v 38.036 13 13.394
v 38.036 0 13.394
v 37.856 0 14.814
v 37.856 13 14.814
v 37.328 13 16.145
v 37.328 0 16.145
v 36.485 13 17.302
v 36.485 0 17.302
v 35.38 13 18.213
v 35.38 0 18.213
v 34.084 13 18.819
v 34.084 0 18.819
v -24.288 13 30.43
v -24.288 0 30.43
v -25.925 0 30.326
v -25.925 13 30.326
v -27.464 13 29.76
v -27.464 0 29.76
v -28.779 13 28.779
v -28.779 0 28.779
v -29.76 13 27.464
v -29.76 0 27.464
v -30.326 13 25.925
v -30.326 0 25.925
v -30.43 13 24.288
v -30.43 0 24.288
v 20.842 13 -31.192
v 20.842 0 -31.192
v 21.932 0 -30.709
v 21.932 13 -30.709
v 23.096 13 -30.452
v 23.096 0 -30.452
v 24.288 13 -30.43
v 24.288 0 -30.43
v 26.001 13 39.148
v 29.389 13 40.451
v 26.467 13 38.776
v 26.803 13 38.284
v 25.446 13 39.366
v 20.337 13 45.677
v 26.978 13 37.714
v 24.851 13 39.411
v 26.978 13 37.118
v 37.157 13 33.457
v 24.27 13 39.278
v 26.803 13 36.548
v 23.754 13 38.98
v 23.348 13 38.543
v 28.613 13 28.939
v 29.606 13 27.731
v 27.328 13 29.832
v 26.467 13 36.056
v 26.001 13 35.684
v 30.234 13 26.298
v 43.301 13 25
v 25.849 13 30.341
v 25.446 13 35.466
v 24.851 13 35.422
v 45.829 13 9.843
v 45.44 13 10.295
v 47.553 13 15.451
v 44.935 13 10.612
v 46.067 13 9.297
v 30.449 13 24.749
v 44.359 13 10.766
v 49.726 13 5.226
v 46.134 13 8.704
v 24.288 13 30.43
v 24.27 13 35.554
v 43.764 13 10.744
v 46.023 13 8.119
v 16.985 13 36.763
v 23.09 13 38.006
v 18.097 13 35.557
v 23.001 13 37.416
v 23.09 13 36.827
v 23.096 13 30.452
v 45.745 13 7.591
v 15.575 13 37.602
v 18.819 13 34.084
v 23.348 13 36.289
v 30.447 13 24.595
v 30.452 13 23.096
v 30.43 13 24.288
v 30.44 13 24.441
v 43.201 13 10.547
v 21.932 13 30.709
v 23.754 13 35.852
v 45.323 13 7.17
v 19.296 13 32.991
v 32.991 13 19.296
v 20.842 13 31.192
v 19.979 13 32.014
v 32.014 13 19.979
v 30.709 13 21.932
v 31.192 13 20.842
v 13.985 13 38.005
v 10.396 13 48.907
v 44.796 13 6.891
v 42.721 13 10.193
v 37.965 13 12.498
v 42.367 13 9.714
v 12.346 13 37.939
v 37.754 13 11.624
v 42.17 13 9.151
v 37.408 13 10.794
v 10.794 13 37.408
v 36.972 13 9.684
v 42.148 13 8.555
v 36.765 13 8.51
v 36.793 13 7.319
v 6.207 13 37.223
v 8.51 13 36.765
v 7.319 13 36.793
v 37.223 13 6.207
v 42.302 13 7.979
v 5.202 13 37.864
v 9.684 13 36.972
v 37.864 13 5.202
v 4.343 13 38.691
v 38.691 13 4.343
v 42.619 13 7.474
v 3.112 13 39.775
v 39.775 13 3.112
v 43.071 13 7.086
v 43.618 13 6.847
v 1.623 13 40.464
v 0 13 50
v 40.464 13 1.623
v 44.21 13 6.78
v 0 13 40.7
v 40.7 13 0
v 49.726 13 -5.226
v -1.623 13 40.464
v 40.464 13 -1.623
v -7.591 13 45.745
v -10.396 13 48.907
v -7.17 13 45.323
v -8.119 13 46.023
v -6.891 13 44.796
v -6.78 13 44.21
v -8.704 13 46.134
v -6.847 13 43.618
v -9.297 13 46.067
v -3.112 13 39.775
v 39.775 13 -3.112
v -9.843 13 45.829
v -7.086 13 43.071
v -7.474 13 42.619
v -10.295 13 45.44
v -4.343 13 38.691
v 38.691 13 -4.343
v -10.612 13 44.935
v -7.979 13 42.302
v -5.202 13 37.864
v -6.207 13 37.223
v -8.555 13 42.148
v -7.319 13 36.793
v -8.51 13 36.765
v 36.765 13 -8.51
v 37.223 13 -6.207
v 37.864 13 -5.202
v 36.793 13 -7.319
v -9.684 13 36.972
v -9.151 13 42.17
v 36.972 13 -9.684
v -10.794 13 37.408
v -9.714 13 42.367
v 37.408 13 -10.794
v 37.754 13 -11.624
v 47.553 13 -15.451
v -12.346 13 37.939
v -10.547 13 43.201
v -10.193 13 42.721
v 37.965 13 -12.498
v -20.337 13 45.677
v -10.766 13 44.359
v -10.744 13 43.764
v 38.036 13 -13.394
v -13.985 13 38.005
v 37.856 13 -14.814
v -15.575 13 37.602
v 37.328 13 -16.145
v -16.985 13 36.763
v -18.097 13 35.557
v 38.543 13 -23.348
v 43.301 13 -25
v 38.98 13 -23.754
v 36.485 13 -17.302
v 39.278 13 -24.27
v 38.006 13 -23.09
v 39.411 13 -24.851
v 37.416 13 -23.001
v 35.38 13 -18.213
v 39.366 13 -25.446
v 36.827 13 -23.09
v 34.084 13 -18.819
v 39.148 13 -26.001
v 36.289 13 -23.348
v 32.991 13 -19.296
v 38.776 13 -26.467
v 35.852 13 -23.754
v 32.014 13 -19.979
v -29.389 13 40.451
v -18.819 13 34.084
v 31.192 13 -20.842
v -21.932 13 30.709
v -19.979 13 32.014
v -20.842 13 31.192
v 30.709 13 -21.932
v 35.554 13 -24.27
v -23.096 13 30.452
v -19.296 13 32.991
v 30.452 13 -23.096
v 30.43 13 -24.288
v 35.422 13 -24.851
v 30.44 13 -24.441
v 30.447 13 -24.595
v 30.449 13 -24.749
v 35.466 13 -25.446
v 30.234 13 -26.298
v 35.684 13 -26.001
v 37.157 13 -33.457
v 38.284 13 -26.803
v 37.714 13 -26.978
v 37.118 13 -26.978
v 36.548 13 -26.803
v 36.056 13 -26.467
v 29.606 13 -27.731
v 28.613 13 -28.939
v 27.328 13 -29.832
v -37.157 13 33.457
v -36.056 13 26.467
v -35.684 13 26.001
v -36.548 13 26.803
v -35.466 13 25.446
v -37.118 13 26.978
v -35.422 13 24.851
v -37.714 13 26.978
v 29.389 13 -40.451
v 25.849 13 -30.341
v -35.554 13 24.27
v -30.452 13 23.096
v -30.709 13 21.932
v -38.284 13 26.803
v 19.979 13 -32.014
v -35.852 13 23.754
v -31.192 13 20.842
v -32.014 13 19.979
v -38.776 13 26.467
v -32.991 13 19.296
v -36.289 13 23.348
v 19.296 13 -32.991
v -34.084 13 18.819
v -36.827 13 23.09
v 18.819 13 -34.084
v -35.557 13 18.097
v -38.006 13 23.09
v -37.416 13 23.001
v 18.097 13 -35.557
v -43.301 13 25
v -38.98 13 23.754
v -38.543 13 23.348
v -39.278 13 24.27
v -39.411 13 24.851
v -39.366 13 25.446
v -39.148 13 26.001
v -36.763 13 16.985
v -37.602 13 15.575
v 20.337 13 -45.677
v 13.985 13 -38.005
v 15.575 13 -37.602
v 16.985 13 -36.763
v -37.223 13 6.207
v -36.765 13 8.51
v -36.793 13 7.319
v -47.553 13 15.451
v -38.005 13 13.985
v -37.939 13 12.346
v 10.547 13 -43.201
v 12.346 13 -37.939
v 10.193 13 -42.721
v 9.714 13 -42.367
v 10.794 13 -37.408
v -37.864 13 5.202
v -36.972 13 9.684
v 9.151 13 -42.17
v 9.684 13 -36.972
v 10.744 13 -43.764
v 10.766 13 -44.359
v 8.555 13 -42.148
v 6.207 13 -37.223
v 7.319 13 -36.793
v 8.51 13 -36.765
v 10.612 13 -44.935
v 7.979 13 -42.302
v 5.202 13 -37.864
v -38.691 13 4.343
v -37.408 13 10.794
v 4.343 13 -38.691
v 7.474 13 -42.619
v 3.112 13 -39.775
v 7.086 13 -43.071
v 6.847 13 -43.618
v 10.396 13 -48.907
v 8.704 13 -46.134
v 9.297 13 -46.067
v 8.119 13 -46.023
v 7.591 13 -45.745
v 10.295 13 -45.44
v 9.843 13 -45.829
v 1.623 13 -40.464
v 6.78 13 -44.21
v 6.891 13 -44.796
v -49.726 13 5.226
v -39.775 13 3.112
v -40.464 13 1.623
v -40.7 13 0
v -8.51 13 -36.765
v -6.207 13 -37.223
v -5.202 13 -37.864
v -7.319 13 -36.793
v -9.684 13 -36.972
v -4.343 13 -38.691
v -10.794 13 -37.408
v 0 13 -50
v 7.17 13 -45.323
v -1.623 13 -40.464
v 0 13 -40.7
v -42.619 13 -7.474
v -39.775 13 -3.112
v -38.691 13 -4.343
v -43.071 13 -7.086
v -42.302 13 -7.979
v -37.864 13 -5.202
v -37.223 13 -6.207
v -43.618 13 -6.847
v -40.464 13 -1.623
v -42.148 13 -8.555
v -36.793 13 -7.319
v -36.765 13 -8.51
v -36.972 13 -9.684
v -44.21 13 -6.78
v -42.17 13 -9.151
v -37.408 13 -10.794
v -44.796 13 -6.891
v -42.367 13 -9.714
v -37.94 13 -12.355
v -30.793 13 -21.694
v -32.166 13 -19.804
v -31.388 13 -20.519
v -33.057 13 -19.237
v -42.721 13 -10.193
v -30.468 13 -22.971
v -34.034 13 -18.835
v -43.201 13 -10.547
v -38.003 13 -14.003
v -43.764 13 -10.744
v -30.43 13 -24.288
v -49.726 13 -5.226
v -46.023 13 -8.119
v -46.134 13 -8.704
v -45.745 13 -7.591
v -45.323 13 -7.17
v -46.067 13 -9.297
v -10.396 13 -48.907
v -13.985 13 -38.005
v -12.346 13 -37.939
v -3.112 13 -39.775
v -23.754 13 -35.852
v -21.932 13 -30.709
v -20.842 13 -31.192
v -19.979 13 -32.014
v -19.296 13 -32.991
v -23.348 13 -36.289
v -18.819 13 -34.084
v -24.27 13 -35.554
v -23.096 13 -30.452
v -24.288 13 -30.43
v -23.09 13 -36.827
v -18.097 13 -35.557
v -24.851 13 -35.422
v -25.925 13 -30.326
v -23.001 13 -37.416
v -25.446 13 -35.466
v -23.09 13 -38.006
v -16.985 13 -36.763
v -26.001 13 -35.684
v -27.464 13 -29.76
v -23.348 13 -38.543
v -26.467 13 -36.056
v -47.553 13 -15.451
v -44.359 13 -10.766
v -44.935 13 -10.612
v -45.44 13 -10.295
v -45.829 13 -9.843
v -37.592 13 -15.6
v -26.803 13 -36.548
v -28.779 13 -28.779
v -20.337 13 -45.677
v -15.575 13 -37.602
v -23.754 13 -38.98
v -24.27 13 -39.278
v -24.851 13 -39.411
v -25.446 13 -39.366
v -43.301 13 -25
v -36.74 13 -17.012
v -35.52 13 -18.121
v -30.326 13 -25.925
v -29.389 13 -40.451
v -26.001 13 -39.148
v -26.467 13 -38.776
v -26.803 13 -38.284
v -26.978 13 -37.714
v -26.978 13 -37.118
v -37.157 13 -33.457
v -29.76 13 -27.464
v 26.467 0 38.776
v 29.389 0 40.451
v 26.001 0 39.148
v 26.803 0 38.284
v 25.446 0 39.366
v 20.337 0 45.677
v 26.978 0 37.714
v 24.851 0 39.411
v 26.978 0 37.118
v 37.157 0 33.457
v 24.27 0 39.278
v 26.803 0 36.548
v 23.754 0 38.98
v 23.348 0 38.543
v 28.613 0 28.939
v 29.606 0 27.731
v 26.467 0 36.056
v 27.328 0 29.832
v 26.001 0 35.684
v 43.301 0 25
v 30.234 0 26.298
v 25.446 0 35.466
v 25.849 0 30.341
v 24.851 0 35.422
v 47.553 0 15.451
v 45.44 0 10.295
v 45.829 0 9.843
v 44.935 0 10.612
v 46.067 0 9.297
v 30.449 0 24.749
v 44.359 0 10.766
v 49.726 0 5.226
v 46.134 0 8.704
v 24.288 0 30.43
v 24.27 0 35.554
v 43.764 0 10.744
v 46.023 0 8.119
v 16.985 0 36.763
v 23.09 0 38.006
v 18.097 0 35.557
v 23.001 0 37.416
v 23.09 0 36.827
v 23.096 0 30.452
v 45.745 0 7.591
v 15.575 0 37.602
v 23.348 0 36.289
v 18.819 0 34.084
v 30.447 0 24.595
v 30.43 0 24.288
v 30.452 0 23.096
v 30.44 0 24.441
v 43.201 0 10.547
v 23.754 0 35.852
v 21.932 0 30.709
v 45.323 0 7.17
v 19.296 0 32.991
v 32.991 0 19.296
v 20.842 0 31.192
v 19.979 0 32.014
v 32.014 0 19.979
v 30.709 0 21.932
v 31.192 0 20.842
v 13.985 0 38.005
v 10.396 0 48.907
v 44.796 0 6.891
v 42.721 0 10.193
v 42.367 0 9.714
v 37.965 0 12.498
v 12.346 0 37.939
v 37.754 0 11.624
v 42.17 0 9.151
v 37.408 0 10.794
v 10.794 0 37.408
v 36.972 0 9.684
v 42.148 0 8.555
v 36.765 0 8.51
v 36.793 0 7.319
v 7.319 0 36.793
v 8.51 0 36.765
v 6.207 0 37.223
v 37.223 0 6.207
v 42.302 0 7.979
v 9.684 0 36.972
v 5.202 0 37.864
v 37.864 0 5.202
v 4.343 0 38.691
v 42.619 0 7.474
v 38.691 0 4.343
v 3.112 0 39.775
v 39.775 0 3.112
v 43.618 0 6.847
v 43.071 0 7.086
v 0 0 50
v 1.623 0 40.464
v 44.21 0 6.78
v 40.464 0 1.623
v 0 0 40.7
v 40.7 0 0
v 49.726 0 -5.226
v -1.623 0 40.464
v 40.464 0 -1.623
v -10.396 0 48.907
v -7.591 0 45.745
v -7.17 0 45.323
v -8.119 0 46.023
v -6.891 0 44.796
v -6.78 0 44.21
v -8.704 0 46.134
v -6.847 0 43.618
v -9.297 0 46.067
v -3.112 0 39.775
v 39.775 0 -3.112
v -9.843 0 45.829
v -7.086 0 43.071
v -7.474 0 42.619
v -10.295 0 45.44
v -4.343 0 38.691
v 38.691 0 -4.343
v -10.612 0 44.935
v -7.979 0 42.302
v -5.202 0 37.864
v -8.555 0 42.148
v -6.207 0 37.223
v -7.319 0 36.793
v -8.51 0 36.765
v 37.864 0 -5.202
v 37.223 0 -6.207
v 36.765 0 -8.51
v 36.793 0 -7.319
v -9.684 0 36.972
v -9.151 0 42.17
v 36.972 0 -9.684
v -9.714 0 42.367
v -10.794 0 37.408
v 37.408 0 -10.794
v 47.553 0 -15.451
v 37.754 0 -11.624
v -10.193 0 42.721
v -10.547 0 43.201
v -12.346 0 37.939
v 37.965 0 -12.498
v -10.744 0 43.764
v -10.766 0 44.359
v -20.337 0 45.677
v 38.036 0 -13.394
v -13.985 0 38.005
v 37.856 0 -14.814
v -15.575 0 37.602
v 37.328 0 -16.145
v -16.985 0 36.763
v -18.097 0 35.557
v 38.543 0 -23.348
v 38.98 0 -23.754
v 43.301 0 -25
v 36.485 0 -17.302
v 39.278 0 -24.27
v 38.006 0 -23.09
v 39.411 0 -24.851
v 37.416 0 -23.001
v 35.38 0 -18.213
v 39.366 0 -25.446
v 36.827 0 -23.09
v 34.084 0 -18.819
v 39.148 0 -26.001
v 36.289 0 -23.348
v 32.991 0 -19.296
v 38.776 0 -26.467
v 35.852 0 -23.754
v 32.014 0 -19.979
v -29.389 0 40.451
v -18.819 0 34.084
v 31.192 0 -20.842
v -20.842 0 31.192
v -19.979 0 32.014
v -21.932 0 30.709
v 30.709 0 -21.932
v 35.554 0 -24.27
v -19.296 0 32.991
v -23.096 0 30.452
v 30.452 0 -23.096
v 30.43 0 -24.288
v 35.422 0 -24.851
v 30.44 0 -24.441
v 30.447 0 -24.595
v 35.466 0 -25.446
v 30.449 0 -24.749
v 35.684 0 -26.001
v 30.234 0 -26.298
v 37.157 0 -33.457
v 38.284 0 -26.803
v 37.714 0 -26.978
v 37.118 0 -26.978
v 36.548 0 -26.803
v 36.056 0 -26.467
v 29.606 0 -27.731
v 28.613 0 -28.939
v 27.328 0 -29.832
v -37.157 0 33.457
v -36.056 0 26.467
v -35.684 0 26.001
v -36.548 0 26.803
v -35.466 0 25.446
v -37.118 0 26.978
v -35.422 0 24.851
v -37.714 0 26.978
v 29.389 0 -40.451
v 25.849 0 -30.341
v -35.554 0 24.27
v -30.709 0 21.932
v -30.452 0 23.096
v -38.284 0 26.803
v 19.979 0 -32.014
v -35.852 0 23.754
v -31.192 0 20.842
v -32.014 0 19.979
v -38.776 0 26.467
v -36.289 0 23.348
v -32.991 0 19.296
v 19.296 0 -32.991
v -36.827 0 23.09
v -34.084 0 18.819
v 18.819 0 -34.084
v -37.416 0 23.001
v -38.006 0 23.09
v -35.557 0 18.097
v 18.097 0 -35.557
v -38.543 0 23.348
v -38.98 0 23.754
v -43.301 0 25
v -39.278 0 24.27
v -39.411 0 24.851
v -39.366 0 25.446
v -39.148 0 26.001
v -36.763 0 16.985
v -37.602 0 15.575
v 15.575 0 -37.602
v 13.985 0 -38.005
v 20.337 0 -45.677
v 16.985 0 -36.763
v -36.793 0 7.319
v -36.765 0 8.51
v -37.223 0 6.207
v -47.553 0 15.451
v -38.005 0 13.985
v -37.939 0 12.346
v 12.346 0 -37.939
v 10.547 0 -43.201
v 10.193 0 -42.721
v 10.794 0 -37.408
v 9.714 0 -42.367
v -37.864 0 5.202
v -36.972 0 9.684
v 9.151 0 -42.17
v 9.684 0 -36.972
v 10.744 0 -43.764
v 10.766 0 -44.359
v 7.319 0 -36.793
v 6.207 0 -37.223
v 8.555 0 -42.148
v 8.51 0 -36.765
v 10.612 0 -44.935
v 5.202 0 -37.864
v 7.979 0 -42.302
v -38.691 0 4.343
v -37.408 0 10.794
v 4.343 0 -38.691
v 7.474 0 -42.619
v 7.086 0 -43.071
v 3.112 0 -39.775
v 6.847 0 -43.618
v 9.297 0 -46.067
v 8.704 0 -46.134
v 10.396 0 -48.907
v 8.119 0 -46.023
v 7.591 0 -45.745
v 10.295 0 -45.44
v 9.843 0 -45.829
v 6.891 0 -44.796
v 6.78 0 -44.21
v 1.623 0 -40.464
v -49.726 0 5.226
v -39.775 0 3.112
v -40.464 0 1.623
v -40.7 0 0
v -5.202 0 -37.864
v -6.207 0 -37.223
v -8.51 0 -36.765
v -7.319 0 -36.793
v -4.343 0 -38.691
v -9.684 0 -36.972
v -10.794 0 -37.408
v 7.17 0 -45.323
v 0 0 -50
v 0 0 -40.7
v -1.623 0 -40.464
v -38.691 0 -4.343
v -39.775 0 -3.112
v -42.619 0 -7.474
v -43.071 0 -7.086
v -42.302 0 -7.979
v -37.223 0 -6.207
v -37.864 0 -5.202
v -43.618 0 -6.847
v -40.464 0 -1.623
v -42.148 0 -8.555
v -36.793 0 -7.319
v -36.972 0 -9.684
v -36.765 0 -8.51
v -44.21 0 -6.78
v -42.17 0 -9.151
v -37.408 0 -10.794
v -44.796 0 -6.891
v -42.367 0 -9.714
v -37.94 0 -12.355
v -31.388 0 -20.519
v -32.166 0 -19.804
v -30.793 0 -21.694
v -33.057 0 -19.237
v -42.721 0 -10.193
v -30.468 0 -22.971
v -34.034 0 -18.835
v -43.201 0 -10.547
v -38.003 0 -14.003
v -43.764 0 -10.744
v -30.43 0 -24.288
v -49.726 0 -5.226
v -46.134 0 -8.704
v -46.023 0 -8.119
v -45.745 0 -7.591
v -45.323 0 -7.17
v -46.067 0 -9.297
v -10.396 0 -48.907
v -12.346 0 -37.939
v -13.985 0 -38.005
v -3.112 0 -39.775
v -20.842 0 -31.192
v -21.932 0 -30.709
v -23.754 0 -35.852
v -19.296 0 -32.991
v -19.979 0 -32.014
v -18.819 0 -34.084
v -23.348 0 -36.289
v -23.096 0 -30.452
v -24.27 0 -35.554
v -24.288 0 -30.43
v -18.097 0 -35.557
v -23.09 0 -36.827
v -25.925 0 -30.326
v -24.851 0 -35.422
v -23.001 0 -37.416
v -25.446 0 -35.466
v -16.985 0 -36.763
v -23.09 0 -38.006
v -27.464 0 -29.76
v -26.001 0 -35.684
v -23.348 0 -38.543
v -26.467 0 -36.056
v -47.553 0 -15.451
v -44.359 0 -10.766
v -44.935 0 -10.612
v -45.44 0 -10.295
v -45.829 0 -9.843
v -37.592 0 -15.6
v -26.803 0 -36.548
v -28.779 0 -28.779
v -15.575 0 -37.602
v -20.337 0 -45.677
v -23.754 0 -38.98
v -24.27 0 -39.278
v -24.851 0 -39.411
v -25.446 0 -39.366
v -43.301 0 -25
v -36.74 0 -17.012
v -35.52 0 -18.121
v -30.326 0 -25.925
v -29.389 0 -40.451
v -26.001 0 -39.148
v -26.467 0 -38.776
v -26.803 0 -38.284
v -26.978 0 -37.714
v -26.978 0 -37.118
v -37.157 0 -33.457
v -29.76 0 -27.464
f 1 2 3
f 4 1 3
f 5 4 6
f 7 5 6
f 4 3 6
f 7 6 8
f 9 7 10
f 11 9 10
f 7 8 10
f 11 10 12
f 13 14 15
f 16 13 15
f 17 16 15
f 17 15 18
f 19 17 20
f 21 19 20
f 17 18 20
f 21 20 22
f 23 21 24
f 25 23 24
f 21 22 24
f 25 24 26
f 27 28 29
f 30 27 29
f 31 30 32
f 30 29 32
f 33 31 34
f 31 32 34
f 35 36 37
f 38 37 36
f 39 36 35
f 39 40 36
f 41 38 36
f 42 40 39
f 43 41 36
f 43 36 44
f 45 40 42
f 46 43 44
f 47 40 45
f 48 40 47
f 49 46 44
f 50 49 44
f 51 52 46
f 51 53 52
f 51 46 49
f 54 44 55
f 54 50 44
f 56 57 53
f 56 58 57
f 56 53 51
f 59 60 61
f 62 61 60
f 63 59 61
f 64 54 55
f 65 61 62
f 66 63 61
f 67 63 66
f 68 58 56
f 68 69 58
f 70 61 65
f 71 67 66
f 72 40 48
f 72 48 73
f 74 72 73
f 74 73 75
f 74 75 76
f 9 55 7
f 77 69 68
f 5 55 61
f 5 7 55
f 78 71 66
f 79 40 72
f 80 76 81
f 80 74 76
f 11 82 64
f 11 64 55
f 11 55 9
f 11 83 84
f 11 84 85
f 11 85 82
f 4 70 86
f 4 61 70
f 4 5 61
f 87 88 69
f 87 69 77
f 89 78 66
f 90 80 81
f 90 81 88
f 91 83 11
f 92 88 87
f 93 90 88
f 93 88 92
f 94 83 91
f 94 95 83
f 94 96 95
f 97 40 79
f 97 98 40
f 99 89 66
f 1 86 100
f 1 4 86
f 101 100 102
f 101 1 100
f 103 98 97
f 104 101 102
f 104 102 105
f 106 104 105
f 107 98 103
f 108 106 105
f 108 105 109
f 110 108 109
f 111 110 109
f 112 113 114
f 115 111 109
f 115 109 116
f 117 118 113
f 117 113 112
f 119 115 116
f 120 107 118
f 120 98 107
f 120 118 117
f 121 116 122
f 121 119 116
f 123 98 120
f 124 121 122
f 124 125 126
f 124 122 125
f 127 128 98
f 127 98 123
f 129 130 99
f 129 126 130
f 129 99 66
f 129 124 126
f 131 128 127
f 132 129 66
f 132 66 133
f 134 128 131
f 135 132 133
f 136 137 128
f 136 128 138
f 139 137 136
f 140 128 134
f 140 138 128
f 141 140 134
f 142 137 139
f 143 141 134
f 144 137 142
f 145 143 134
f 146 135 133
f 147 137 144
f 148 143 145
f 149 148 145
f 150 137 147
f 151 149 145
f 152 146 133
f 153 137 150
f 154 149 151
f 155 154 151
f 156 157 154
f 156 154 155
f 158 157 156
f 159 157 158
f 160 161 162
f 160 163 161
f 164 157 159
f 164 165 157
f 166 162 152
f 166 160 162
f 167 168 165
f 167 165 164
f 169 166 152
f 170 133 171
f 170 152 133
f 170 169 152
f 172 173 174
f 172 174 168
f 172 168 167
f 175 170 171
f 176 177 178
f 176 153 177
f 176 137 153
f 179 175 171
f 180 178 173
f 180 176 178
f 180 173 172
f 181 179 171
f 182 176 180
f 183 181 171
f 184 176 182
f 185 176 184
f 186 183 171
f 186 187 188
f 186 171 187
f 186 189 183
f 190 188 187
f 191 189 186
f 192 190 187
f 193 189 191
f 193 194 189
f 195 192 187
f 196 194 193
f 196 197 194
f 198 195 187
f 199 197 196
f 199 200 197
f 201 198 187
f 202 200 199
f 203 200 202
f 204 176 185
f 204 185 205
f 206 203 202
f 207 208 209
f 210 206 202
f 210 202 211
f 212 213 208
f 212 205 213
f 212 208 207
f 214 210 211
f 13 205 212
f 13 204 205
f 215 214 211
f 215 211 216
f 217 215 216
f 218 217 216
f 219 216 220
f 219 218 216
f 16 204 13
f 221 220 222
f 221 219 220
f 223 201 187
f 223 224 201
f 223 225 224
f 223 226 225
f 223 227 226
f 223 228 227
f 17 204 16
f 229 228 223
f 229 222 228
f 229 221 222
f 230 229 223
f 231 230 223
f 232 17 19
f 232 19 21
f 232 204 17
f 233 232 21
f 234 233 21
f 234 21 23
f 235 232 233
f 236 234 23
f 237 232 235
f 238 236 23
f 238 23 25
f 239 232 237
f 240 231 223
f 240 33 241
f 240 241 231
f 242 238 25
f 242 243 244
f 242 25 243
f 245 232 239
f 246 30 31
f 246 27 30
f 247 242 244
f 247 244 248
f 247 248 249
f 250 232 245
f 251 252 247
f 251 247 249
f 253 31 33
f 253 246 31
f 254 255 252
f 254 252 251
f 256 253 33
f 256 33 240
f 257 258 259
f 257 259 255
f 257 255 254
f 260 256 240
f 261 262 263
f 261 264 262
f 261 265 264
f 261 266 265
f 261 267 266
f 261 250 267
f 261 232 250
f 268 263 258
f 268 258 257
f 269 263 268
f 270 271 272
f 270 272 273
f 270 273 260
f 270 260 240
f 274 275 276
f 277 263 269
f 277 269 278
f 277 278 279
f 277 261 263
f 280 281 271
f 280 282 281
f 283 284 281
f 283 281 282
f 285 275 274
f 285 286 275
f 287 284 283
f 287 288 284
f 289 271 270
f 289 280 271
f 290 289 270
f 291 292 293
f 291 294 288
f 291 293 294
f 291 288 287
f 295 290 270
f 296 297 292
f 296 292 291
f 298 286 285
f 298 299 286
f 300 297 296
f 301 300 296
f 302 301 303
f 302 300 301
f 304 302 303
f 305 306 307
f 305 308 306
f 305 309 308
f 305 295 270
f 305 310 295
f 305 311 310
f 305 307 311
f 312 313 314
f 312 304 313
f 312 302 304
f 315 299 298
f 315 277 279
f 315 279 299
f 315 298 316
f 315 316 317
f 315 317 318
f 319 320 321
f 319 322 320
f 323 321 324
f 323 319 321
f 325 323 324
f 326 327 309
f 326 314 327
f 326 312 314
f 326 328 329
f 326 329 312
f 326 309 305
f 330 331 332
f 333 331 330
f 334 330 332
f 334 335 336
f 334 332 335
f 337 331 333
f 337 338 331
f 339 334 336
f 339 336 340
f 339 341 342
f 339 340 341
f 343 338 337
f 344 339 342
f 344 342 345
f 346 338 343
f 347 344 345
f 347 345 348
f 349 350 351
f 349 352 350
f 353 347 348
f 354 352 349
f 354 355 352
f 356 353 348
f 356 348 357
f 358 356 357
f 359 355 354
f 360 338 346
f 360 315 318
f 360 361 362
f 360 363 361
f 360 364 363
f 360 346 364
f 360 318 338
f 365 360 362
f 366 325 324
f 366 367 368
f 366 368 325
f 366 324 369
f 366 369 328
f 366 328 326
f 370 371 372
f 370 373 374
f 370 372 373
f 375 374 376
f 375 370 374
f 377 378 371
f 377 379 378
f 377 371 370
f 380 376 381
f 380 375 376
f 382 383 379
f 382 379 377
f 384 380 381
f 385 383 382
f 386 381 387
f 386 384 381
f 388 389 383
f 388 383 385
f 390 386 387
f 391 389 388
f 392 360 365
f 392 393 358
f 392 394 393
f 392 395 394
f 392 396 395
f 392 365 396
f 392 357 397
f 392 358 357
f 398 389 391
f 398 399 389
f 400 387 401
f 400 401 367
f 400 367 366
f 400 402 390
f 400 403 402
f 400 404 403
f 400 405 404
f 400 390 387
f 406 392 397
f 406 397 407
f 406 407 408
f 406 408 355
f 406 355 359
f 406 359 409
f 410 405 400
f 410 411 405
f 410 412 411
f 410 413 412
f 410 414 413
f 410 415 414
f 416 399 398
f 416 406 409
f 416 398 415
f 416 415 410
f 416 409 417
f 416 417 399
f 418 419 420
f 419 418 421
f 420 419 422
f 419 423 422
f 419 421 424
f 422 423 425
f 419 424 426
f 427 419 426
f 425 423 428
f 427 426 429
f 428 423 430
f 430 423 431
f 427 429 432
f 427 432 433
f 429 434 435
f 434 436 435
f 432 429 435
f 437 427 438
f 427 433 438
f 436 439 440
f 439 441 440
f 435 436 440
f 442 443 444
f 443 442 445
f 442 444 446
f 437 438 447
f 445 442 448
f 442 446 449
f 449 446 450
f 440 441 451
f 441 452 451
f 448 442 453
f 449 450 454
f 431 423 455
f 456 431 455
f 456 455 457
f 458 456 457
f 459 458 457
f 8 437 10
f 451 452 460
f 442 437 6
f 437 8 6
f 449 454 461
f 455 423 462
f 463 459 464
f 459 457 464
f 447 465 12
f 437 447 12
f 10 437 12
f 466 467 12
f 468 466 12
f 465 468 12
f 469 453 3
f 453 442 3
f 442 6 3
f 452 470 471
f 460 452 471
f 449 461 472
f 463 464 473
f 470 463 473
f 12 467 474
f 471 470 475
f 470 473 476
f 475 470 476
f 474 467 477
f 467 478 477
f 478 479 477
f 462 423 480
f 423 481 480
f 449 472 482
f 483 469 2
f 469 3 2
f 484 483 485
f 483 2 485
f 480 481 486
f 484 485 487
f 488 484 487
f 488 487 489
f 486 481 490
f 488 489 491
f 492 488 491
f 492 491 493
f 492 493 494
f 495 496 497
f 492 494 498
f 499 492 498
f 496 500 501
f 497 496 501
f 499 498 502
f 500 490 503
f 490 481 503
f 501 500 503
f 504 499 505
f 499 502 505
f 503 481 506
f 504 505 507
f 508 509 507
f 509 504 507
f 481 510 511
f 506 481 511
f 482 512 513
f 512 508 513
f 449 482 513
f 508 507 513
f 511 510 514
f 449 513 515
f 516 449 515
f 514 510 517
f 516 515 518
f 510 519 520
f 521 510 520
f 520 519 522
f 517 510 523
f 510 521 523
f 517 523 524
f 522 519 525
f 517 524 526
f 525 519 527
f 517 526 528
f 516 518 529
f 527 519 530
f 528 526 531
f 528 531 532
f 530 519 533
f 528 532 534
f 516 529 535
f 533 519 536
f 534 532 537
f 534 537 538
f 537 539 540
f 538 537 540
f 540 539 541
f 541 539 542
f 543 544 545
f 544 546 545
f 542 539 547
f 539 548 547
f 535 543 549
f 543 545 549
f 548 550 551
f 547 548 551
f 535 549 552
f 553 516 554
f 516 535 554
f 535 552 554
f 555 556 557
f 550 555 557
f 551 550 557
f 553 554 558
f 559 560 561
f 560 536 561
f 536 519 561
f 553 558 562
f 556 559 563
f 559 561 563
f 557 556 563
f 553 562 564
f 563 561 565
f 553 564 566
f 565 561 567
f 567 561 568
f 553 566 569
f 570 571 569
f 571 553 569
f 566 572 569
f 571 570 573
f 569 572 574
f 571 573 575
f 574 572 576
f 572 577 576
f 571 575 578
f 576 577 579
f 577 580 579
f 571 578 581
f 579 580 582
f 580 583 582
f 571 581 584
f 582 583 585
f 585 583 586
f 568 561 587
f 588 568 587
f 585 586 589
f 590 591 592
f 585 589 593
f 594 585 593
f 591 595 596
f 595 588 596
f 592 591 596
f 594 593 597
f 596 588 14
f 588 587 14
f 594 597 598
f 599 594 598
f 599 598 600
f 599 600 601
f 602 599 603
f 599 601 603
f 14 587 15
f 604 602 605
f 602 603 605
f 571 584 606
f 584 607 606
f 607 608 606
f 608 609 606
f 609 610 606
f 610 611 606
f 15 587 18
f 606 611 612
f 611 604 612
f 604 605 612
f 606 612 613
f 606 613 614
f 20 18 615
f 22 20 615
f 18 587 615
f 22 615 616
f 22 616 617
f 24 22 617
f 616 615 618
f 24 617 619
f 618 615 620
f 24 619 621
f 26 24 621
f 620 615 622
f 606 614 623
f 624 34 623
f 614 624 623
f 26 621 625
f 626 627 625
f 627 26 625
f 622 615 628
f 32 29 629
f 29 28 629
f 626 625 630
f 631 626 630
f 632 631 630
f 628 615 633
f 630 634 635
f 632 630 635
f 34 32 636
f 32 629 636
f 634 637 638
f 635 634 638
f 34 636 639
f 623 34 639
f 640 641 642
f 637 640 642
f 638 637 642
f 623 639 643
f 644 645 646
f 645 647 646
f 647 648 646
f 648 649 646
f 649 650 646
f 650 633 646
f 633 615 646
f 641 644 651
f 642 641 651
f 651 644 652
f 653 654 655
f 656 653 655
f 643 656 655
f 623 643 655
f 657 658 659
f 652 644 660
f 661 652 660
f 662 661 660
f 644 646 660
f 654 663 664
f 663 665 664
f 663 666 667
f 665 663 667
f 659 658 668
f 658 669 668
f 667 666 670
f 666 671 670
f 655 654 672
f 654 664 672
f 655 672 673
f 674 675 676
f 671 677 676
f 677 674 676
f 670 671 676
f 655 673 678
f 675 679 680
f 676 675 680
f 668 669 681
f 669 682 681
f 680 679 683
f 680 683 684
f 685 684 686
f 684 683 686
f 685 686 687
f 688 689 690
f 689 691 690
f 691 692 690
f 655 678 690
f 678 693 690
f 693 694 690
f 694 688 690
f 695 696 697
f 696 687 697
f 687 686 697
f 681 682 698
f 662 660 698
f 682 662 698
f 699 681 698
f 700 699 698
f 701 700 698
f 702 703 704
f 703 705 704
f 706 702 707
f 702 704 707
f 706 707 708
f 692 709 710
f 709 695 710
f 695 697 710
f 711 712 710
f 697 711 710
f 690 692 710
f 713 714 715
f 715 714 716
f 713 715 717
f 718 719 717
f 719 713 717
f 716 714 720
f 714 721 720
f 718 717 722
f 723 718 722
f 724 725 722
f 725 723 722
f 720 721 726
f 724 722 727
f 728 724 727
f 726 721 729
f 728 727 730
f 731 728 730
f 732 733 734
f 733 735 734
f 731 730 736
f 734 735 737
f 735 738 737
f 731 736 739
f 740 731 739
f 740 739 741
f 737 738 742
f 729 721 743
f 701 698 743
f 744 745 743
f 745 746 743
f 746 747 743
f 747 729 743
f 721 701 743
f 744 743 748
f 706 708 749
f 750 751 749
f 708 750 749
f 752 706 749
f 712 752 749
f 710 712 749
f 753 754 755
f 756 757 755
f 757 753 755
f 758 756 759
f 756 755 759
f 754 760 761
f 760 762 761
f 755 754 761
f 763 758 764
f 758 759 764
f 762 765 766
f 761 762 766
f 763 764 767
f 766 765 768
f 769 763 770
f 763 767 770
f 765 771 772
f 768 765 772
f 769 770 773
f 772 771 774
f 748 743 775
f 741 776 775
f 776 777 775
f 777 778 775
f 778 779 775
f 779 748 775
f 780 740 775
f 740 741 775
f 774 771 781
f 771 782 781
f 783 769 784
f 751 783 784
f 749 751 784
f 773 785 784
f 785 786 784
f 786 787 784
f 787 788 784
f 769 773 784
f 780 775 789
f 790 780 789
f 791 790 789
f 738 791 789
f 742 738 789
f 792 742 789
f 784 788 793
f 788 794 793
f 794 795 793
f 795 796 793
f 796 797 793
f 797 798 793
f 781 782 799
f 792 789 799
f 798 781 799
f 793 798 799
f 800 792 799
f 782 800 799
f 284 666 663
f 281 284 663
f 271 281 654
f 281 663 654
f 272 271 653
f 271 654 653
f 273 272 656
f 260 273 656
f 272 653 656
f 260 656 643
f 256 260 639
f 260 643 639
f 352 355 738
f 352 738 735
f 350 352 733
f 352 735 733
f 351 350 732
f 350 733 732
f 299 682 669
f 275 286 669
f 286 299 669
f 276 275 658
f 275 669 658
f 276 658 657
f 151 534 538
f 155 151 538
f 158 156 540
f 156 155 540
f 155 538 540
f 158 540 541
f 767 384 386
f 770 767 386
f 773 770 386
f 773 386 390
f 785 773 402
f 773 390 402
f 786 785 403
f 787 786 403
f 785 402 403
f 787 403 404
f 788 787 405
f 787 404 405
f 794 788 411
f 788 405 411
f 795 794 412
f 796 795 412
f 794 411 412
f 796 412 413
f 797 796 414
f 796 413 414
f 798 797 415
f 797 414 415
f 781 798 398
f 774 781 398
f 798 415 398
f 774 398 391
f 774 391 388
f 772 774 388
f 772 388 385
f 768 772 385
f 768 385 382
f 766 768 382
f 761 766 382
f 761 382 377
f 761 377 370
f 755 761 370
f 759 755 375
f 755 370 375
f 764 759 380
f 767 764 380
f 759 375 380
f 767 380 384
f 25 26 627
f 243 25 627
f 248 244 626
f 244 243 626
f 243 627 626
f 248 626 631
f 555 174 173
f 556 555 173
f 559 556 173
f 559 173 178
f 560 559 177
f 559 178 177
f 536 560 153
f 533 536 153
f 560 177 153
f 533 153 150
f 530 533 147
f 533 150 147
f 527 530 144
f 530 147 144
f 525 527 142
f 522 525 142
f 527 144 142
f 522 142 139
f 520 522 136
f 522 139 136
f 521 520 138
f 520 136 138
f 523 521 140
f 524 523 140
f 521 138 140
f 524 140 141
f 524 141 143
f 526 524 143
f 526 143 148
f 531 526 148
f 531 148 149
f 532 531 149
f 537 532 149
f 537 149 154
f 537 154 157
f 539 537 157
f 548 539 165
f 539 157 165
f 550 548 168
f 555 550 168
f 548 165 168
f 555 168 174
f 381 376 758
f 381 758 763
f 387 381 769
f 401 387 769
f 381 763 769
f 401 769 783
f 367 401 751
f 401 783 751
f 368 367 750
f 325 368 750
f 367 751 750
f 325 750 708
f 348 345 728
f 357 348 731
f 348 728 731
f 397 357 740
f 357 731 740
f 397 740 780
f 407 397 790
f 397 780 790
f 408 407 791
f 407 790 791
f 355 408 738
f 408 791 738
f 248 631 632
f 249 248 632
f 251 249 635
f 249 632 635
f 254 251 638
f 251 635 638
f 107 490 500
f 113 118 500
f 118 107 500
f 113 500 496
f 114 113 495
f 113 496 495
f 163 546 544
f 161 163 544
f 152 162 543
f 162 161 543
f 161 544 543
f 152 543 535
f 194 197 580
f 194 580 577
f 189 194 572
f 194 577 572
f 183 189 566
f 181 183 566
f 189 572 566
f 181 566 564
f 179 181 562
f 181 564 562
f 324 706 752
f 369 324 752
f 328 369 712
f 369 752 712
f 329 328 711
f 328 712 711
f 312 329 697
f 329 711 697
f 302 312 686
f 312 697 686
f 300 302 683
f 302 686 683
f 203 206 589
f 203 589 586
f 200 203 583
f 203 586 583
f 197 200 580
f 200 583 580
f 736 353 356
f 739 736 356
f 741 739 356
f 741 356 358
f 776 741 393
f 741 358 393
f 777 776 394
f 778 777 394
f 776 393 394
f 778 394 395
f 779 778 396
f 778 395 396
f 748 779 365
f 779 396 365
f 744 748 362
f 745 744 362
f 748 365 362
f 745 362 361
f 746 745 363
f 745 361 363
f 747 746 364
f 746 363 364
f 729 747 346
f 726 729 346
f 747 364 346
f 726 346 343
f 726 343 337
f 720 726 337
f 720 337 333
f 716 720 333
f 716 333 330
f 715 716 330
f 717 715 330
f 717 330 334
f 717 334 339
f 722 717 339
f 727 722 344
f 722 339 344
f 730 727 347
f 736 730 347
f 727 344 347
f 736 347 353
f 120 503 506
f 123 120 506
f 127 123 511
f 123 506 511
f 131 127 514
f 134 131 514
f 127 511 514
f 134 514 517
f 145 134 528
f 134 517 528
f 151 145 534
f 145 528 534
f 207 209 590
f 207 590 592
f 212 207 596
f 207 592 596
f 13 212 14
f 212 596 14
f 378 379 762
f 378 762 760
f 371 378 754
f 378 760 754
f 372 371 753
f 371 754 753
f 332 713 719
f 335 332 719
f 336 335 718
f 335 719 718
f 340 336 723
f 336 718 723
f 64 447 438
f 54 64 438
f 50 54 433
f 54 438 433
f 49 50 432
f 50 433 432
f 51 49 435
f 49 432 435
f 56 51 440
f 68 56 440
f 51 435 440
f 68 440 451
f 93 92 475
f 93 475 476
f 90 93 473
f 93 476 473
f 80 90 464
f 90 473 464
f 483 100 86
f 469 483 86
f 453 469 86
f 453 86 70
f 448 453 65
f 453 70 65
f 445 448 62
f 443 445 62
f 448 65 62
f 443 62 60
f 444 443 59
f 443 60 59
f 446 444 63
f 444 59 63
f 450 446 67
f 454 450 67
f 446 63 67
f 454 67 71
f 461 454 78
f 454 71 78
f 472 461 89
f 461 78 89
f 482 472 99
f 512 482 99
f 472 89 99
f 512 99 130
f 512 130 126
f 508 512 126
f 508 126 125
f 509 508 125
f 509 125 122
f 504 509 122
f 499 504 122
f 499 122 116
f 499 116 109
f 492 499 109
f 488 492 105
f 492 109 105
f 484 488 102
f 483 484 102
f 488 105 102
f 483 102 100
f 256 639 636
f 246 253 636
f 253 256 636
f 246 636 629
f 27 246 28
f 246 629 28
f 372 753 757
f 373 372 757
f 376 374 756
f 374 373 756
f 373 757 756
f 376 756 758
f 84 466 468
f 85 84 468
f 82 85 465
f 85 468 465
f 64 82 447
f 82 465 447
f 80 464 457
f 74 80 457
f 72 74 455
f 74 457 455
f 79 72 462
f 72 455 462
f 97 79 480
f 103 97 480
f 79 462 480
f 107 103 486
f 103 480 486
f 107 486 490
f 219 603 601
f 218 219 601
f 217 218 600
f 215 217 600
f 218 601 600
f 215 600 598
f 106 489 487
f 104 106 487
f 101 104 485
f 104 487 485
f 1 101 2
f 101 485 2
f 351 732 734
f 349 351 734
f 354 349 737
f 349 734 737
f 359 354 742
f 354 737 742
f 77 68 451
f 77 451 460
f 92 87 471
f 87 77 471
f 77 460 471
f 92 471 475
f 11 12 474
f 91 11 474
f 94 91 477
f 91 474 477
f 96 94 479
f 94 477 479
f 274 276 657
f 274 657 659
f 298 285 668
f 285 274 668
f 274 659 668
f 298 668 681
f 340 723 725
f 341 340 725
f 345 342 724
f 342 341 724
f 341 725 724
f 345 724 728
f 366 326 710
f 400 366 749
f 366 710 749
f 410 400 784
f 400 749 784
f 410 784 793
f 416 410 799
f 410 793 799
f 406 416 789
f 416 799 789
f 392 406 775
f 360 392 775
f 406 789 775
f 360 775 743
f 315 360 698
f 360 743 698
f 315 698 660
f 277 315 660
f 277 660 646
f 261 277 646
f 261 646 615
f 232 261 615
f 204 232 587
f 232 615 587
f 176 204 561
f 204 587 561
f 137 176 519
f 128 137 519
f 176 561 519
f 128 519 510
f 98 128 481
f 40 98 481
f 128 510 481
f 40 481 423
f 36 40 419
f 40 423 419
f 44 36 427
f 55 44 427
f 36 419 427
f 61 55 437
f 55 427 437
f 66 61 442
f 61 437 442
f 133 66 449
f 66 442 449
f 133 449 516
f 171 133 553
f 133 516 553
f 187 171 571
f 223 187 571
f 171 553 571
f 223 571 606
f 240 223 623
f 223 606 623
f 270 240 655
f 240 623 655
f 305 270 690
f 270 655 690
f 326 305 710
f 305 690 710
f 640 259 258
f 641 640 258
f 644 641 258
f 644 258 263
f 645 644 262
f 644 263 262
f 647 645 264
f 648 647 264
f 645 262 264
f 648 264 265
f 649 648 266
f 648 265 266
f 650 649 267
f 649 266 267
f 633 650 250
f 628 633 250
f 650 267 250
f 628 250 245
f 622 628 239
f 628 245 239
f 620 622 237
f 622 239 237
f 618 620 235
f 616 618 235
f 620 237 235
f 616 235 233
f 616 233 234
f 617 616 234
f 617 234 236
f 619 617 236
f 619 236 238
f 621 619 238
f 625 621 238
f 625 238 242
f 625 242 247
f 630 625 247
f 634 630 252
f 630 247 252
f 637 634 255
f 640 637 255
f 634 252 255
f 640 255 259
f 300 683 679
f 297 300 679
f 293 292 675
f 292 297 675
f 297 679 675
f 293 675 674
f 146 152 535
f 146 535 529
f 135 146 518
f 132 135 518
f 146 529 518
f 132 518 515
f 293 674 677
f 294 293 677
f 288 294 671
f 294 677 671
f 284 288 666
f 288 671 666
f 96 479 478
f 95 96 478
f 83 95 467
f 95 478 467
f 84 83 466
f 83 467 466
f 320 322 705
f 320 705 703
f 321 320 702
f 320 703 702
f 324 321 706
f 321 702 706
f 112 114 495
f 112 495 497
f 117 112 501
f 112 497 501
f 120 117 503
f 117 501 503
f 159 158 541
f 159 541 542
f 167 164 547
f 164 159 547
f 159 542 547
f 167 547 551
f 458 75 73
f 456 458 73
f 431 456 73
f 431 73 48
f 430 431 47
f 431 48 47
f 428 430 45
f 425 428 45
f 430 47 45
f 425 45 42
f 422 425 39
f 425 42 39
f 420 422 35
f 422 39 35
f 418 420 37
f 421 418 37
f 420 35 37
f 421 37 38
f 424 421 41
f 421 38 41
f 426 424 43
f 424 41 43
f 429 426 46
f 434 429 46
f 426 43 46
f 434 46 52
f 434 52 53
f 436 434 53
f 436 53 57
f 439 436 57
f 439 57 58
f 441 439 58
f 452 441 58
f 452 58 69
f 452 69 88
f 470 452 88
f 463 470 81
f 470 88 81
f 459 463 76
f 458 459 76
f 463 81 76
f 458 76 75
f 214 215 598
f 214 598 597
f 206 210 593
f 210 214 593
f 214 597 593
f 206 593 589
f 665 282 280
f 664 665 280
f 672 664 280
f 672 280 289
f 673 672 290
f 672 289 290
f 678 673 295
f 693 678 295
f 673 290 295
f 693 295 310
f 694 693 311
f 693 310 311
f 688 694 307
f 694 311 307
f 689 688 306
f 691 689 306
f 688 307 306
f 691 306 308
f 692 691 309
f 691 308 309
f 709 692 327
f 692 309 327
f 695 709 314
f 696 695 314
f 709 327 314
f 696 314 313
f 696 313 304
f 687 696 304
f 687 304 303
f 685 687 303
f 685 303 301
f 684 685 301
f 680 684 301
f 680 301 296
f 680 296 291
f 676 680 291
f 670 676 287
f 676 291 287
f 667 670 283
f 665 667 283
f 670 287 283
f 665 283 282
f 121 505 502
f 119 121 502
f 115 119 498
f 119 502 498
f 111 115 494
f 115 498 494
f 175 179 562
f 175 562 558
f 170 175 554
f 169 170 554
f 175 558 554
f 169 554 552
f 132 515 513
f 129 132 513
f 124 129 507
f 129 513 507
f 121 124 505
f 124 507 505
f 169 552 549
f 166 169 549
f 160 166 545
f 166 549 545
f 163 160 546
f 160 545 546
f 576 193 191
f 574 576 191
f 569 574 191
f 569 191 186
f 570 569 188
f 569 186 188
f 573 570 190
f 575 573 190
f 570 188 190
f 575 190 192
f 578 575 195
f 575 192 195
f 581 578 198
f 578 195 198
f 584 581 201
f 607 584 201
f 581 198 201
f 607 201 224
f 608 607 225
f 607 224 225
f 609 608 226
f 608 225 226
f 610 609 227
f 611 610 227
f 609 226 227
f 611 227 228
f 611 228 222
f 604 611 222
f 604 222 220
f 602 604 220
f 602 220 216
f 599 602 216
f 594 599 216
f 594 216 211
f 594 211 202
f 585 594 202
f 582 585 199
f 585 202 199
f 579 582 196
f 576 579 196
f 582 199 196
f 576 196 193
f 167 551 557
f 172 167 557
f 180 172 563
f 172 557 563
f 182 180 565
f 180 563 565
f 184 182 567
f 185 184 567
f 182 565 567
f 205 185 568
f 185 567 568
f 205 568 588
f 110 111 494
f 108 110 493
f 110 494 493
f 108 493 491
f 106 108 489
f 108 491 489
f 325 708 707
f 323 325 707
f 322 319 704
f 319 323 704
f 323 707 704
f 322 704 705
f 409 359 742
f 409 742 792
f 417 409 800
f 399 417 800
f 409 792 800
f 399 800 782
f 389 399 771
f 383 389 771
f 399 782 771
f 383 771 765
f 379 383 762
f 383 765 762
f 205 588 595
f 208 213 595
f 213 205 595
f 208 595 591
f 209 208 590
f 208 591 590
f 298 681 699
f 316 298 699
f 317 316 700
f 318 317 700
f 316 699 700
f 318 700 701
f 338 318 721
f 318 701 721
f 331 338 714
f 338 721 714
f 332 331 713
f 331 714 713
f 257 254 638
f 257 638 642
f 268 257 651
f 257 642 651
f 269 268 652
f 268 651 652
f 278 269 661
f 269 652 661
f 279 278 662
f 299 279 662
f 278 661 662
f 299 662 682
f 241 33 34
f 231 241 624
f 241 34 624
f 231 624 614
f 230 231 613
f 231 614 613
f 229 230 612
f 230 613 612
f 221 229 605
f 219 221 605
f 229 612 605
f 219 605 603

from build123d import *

# Parameters (mm, degrees)
SKETCH1_R           = 50
BOSS_EXTRUDE1_DEPTH = 13
FILLET1_R           = 6
FILLET2_R           = 6
SKETCH2_R           = 2
CUT_EXTRUDE1_DEPTH  = 13
CIRPATTERN1_COUNT   = 8


with BuildPart() as part:
    # Sketch1 → Boss-Extrude1 (new body)
    with BuildSketch(Plane(origin=(0, 0, 0), x_dir=(1, 0, 0), z_dir=(0, 1, 0))):
        with Locations(Location((0, 0, 0), (0, 0, 90))):
            Circle(SKETCH1_R)
        with BuildLine():
            ThreePointArc((36.323181231, 9.32075669), (36.779448015, 7.315887076), (37.125142857, 5.289023335))
            ThreePointArc((37.125142857, 5.289023335), (39.722463038, 3.191918366), (40.7, 0))
            ThreePointArc((40.7, 0), (39.722463038, -3.191918366), (37.125142857, -5.289023335))
            ThreePointArc((37.125142857, -5.289023335), (36.779448015, -7.315887076), (36.323181231, -9.32075669))
            ThreePointArc((36.323181231, -9.32075669), (37.590218254, -11.184640418), (38.035783638, -13.393920133))
            ThreePointArc((38.035783638, -13.393920133), (36.344793491, -17.445813517), (32.275138024, -19.093597502))
            ThreePointArc((32.275138024, -19.093597502), (31.180110461, -20.833883738), (29.991344533, -22.511536001))
            ThreePointArc((29.991344533, -22.511536001), (30.333218561, -23.606997658), (30.448737342, -24.748737342))
            ThreePointArc((30.448737342, -24.748737342), (27.890230009, -29.504893754), (22.511536001, -29.991344533))
            ThreePointArc((22.511536001, -29.991344533), (20.833883738, -31.180110461), (19.093597502, -32.275138024))
            ThreePointArc((19.093597502, -32.275138024), (19.093839474, -32.305460402), (19.093920133, -32.335783638))
            ThreePointArc((19.093920133, -32.335783638), (15.547169813, -37.613426655), (9.32075669, -36.323181231))
            ThreePointArc((9.32075669, -36.323181231), (7.315887076, -36.779448015), (5.289023335, -37.125142857))
            ThreePointArc((5.289023335, -37.125142857), (0, -40.7), (-5.289023335, -37.125142857))
            ThreePointArc((-5.289023335, -37.125142857), (-7.315887076, -36.779448015), (-9.32075669, -36.323181231))
            ThreePointArc((-9.32075669, -36.323181231), (-15.575215697, -37.601896973), (-19.093597502, -32.275138024))
            ThreePointArc((-19.093597502, -32.275138024), (-20.833883738, -31.180110461), (-22.511536001, -29.991344533))
            ThreePointArc((-22.511536001, -29.991344533), (-28.779245994, -28.779245994), (-29.991344533, -22.511536001))
            ThreePointArc((-29.991344533, -22.511536001), (-31.180110461, -20.833883738), (-32.275138024, -19.093597502))
            ThreePointArc((-32.275138024, -19.093597502), (-37.601896973, -15.575215697), (-36.323181231, -9.32075669))
            ThreePointArc((-36.323181231, -9.32075669), (-36.779448015, -7.315887076), (-37.125142857, -5.289023335))
            ThreePointArc((-37.125142857, -5.289023335), (-40.7, 0), (-37.125142857, 5.289023335))
            ThreePointArc((-37.125142857, 5.289023335), (-36.779448015, 7.315887076), (-36.323181231, 9.32075669))
            ThreePointArc((-36.323181231, 9.32075669), (-37.601896973, 15.575215697), (-32.275138024, 19.093597502))
            ThreePointArc((-32.275138024, 19.093597502), (-31.180110461, 20.833883738), (-29.991344533, 22.511536001))
            ThreePointArc((-29.991344533, 22.511536001), (-28.779245994, 28.779245994), (-22.511536001, 29.991344533))
            ThreePointArc((-22.511536001, 29.991344533), (-20.833883738, 31.180110461), (-19.093597502, 32.275138024))
            ThreePointArc((-19.093597502, 32.275138024), (-15.575215697, 37.601896973), (-9.32075669, 36.323181231))
            ThreePointArc((-9.32075669, 36.323181231), (-7.315887076, 36.779448015), (-5.289023335, 37.125142857))
            ThreePointArc((-5.289023335, 37.125142857), (0, 40.7), (5.289023335, 37.125142857))
            ThreePointArc((5.289023335, 37.125142857), (7.315887076, 36.779448015), (9.32075669, 36.323181231))
            ThreePointArc((9.32075669, 36.323181231), (15.547169813, 37.613426655), (19.093920133, 32.335783638))
            ThreePointArc((19.093920133, 32.335783638), (19.093839474, 32.305460402), (19.093597502, 32.275138024))
            ThreePointArc((19.093597502, 32.275138024), (20.833883738, 31.180110461), (22.511536001, 29.991344533))
            ThreePointArc((22.511536001, 29.991344533), (27.890230009, 29.504893754), (30.448737342, 24.748737342))
            ThreePointArc((30.448737342, 24.748737342), (30.333218561, 23.606997658), (29.991344533, 22.511536001))
            ThreePointArc((29.991344533, 22.511536001), (31.180110461, 20.833883738), (32.275138024, 19.093597502))
            ThreePointArc((32.275138024, 19.093597502), (36.344793491, 17.445813517), (38.035783638, 13.393920133))
            ThreePointArc((38.035783638, 13.393920133), (37.590218254, 11.184640418), (36.323181231, 9.32075669))
        make_face(mode=Mode.SUBTRACT)
    extrude(amount=BOSS_EXTRUDE1_DEPTH)

    # Fillet1
    # the kernel refuses this fillet: 6 mm, written as the material it takes off along each edge
    with BuildSketch(Plane(origin=(-19.093597502, -6.083636121, -32.275138024), x_dir=(0.14995847999359607, 0, -0.9886922950433115), z_dir=(0, 1, 0)), Plane(origin=(-29.991344533, -6.083636121, -22.511536001), x_dir=(-0.2398125906274579, 0, -0.9708192011783384), z_dir=(0, 1, 0)), Plane(origin=(-36.323181231, -6.083636121, -9.32075669), x_dir=(-0.5930743682320851, 0, -0.8051476844319388), z_dir=(0, 1, 0)), Plane(origin=(-37.125142857, -6.083636121, 5.289023335), x_dir=(-0.8560459495059065, 0, -0.5168997314127094), z_dir=(0, 1, 0)), Plane(origin=(-32.275138024, -6.083636121, 19.093597502), x_dir=(-0.988692295043333, 0, -0.14995847999345324), z_dir=(0, 1, 0)), Plane(origin=(-22.511536001, -6.083636121, 29.991344533), x_dir=(-0.9708192011784058, 0, 0.23981259062718507), z_dir=(0, 1, 0)), Plane(origin=(-9.32075669, -6.083636121, 36.323181231), x_dir=(-0.8051476844318383, 0, 0.5930743682322216), z_dir=(0, 1, 0)), Plane(origin=(5.289023335, -6.083636121, 37.125142857), x_dir=(-0.5168997314124754, 0, 0.8560459495060478), z_dir=(0, 1, 0)), Plane(origin=(29.991344533, -6.083636121, 22.511536001), x_dir=(0.2398125906274932, 0, 0.9708192011783298), z_dir=(0, 1, 0)), Plane(origin=(36.323181231, -6.083636121, 9.32075669), x_dir=(0.5930743682321865, 0, 0.8051476844318642), z_dir=(0, 1, 0)), Plane(origin=(37.125142857, -6.083636121, -5.289023335), x_dir=(0.8560459495059013, 0, 0.5168997314127179), z_dir=(0, 1, 0)), Plane(origin=(32.275138024, -6.083636121, -19.093597502), x_dir=(0.9886922950433297, 0, 0.14995847999347464), z_dir=(0, 1, 0)), Plane(origin=(9.32075669, -6.083636121, -36.323181231), x_dir=(0.8051476844318497, 0, -0.5930743682322063), z_dir=(0, 1, 0)), Plane(origin=(-5.289023335, -6.083636121, -37.125142857), x_dir=(0.5168997314124864, 0, -0.8560459495060411), z_dir=(0, 1, 0))) as fillet1_piece_1:
        with BuildLine():
            CenterArc((2.792165198, 5.922245026), FILLET1_R, 222.951284649, 37.814580314)
            ThreePointArc((-1.599434612, 1.833987316), (-0.784836973, 0.929970912), (0, 0))
            ThreePointArc((0, 0), (0.914674806, 0.073867225), (1.829349612, 0))
        make_face()
    extrude(amount=25.167272242, mode=Mode.SUBTRACT)
    with BuildSketch(Plane(origin=(-22.511536001, -6.083636121, -29.991344533), x_dir=(0.8188257163349287, 0, -0.5740421990312129), z_dir=(0, 1, 0)), Plane(origin=(-37.125142857, -6.083636121, -5.289023335), x_dir=(0.17308808500835637, 0, -0.9849063482525331), z_dir=(0, 1, 0)), Plane(origin=(-36.323181231, -6.083636121, 9.32075669), x_dir=(-0.21699480284666314, 0, -0.9761727590634447), z_dir=(0, 1, 0)), Plane(origin=(-29.991344533, -6.083636121, 22.511536001), x_dir=(-0.5740421990310322, 0, -0.8188257163350555), z_dir=(0, 1, 0)), Plane(origin=(-19.093597502, -6.083636121, 32.275138024), x_dir=(-0.8436968741184279, 0, -0.5368198809682758), z_dir=(0, 1, 0)), Plane(origin=(-5.289023335, -6.083636121, 37.125142857), x_dir=(-0.9849063482524983, 0, -0.17308808500855408), z_dir=(0, 1, 0)), Plane(origin=(22.511536001, -6.083636121, 29.991344533), x_dir=(-0.8188257163349197, 0, 0.574042199031226), z_dir=(0, 1, 0)), Plane(origin=(32.275138024, -6.083636121, 19.093597502), x_dir=(-0.5368198809683398, 0, 0.8436968741183872), z_dir=(0, 1, 0)), Plane(origin=(37.125142857, -6.083636121, 5.289023335), x_dir=(-0.17308808500835057, 0, 0.984906348252534), z_dir=(0, 1, 0)), Plane(origin=(36.323181231, -6.083636121, -9.32075669), x_dir=(0.21699480284658396, 0, 0.9761727590634621), z_dir=(0, 1, 0)), Plane(origin=(29.991344533, -6.083636121, -22.511536001), x_dir=(0.5740421990310425, 0, 0.8188257163350484), z_dir=(0, 1, 0)), Plane(origin=(19.093597502, -6.083636121, -32.275138024), x_dir=(0.8436968741184294, 0, 0.5368198809682734), z_dir=(0, 1, 0)), Plane(origin=(5.289023335, -6.083636121, -37.125142857), x_dir=(0.9849063482524999, 0, 0.17308808500854556), z_dir=(0, 1, 0)), Plane(origin=(-9.32075669, -6.083636121, -36.323181231), x_dir=(0.976172759063475, 0, -0.2169948028465263), z_dir=(0, 1, 0))) as fillet1_piece_2:
        with BuildLine():
            CenterArc((2.628130804, 5.996840928), FILLET1_R, 230.326071091, 37.814580314)
            ThreePointArc((-1.202375121, 1.378700139), (-0.54551709, 0.73790072), (0, 0))
            ThreePointArc((0, 0), (1.216727224, 0.0197442), (2.433454448, 0))
        make_face()
    extrude(amount=25.167272242, mode=Mode.SUBTRACT)
    with BuildSketch(Plane(origin=(9.32075669, -6.083636122, 36.323181231), x_dir=(-0.9761727590638747, 0, 0.2169948028447281), z_dir=(0, 1, 0))) as fillet1_piece_3:
        with BuildLine():
            CenterArc((2.628130805, 5.996840928), FILLET1_R, 230.326071091, 37.814580314)
            ThreePointArc((-1.202375121, 1.378700139), (-0.54551709, 0.73790072), (0, 0))
            ThreePointArc((0, 0), (1.216727224, 0.0197442), (2.433454449, 0))
        make_face()
    extrude(amount=25.167272243, mode=Mode.SUBTRACT)
    with BuildSketch(Plane(origin=(19.093597502, -6.083636121, 32.275138024), x_dir=(-0.14995847999251055, 0, 0.988692295043476), z_dir=(0, 1, 0))) as fillet1_piece_4:
        with BuildLine():
            CenterArc((2.792165198, 5.922245026), FILLET1_R, 222.951284649, 37.814580314)
            ThreePointArc((-1.599434612, 1.833987316), (-0.784836973, 0.929970912), (0, 0))
            ThreePointArc((0, 0), (0.914674806, 0.073867225), (1.829349613, 0))
        make_face()
    extrude(amount=25.167272242, mode=Mode.SUBTRACT)
    with BuildSketch(Plane(origin=(22.511536001, -6.083636121, -29.991344533), x_dir=(-0.81882571633492, 0, -0.5740421990312257), z_dir=(0, 1, 0))) as fillet1_piece_5:
        with BuildLine():
            CenterArc((2.628130804, -5.996840928), FILLET1_R, 91.859348595, 37.814580314)
            ThreePointArc((-1.202375121, -1.378700139), (-0.54551709, -0.73790072), (0, 0))
            ThreePointArc((0, 0), (1.216727224, -0.0197442), (2.433454448, 0))
        make_face()
    extrude(amount=25.167272242, mode=Mode.SUBTRACT)

    # Fillet2
    # the kernel refuses this fillet: 6 mm, written as the material it takes off along each edge
    with BuildSketch(Plane(origin=(-32.275138024, -4.443316345, -19.093597502), x_dir=(0.5282998062723766, 0, -0.8490578983158743), z_dir=(0, 1, 0))) as fillet2_piece_1:
        with BuildLine():
            CenterArc((2.770578985, 5.899824462), FILLET2_R, 229.219707945, 30.295762434)
            Line((-1.148382112, 1.35650586), (-1.226761334, 1.265639488))
            ThreePointArc((-1.226761334, 1.265639488), (-0.612581404, 0.645752673), (-0.102555687, -0.062308354))
            Line((-0.102555687, -0.062308354), (0.002686014, -0.119969935))
            ThreePointArc((0.002686014, -0.119969935), (0.839379399, -0.110604719), (1.656922395, -0.117996489))
            Line((1.656922395, -0.117996489), (1.678758799, 0))
        make_face()
    extrude(amount=21.88663269, mode=Mode.SUBTRACT)

    # Sketch2 → Cut-Extrude1 (cut)
    with BuildSketch(Plane(origin=(0, 13, 0), x_dir=(1, 0, 0), z_dir=(0, 1, 0))):
        with Locations(Location((37.416132554, 25.000660486, 0), (0, 0, 270))):
            Circle(SKETCH2_R)
    cut_extrude1 = extrude(amount=-CUT_EXTRUDE1_DEPTH, mode=Mode.SUBTRACT)

    # CirPattern1: Cut-Extrude1 ×8 about axis
    cirpattern1_axis = Axis((0, 0, 0), (0, 1, 0))
    for i in range(1, CIRPATTERN1_COUNT):
        add(cut_extrude1.rotate(cirpattern1_axis, i * 360 / CIRPATTERN1_COUNT), mode=Mode.SUBTRACT)


solid = part.part
